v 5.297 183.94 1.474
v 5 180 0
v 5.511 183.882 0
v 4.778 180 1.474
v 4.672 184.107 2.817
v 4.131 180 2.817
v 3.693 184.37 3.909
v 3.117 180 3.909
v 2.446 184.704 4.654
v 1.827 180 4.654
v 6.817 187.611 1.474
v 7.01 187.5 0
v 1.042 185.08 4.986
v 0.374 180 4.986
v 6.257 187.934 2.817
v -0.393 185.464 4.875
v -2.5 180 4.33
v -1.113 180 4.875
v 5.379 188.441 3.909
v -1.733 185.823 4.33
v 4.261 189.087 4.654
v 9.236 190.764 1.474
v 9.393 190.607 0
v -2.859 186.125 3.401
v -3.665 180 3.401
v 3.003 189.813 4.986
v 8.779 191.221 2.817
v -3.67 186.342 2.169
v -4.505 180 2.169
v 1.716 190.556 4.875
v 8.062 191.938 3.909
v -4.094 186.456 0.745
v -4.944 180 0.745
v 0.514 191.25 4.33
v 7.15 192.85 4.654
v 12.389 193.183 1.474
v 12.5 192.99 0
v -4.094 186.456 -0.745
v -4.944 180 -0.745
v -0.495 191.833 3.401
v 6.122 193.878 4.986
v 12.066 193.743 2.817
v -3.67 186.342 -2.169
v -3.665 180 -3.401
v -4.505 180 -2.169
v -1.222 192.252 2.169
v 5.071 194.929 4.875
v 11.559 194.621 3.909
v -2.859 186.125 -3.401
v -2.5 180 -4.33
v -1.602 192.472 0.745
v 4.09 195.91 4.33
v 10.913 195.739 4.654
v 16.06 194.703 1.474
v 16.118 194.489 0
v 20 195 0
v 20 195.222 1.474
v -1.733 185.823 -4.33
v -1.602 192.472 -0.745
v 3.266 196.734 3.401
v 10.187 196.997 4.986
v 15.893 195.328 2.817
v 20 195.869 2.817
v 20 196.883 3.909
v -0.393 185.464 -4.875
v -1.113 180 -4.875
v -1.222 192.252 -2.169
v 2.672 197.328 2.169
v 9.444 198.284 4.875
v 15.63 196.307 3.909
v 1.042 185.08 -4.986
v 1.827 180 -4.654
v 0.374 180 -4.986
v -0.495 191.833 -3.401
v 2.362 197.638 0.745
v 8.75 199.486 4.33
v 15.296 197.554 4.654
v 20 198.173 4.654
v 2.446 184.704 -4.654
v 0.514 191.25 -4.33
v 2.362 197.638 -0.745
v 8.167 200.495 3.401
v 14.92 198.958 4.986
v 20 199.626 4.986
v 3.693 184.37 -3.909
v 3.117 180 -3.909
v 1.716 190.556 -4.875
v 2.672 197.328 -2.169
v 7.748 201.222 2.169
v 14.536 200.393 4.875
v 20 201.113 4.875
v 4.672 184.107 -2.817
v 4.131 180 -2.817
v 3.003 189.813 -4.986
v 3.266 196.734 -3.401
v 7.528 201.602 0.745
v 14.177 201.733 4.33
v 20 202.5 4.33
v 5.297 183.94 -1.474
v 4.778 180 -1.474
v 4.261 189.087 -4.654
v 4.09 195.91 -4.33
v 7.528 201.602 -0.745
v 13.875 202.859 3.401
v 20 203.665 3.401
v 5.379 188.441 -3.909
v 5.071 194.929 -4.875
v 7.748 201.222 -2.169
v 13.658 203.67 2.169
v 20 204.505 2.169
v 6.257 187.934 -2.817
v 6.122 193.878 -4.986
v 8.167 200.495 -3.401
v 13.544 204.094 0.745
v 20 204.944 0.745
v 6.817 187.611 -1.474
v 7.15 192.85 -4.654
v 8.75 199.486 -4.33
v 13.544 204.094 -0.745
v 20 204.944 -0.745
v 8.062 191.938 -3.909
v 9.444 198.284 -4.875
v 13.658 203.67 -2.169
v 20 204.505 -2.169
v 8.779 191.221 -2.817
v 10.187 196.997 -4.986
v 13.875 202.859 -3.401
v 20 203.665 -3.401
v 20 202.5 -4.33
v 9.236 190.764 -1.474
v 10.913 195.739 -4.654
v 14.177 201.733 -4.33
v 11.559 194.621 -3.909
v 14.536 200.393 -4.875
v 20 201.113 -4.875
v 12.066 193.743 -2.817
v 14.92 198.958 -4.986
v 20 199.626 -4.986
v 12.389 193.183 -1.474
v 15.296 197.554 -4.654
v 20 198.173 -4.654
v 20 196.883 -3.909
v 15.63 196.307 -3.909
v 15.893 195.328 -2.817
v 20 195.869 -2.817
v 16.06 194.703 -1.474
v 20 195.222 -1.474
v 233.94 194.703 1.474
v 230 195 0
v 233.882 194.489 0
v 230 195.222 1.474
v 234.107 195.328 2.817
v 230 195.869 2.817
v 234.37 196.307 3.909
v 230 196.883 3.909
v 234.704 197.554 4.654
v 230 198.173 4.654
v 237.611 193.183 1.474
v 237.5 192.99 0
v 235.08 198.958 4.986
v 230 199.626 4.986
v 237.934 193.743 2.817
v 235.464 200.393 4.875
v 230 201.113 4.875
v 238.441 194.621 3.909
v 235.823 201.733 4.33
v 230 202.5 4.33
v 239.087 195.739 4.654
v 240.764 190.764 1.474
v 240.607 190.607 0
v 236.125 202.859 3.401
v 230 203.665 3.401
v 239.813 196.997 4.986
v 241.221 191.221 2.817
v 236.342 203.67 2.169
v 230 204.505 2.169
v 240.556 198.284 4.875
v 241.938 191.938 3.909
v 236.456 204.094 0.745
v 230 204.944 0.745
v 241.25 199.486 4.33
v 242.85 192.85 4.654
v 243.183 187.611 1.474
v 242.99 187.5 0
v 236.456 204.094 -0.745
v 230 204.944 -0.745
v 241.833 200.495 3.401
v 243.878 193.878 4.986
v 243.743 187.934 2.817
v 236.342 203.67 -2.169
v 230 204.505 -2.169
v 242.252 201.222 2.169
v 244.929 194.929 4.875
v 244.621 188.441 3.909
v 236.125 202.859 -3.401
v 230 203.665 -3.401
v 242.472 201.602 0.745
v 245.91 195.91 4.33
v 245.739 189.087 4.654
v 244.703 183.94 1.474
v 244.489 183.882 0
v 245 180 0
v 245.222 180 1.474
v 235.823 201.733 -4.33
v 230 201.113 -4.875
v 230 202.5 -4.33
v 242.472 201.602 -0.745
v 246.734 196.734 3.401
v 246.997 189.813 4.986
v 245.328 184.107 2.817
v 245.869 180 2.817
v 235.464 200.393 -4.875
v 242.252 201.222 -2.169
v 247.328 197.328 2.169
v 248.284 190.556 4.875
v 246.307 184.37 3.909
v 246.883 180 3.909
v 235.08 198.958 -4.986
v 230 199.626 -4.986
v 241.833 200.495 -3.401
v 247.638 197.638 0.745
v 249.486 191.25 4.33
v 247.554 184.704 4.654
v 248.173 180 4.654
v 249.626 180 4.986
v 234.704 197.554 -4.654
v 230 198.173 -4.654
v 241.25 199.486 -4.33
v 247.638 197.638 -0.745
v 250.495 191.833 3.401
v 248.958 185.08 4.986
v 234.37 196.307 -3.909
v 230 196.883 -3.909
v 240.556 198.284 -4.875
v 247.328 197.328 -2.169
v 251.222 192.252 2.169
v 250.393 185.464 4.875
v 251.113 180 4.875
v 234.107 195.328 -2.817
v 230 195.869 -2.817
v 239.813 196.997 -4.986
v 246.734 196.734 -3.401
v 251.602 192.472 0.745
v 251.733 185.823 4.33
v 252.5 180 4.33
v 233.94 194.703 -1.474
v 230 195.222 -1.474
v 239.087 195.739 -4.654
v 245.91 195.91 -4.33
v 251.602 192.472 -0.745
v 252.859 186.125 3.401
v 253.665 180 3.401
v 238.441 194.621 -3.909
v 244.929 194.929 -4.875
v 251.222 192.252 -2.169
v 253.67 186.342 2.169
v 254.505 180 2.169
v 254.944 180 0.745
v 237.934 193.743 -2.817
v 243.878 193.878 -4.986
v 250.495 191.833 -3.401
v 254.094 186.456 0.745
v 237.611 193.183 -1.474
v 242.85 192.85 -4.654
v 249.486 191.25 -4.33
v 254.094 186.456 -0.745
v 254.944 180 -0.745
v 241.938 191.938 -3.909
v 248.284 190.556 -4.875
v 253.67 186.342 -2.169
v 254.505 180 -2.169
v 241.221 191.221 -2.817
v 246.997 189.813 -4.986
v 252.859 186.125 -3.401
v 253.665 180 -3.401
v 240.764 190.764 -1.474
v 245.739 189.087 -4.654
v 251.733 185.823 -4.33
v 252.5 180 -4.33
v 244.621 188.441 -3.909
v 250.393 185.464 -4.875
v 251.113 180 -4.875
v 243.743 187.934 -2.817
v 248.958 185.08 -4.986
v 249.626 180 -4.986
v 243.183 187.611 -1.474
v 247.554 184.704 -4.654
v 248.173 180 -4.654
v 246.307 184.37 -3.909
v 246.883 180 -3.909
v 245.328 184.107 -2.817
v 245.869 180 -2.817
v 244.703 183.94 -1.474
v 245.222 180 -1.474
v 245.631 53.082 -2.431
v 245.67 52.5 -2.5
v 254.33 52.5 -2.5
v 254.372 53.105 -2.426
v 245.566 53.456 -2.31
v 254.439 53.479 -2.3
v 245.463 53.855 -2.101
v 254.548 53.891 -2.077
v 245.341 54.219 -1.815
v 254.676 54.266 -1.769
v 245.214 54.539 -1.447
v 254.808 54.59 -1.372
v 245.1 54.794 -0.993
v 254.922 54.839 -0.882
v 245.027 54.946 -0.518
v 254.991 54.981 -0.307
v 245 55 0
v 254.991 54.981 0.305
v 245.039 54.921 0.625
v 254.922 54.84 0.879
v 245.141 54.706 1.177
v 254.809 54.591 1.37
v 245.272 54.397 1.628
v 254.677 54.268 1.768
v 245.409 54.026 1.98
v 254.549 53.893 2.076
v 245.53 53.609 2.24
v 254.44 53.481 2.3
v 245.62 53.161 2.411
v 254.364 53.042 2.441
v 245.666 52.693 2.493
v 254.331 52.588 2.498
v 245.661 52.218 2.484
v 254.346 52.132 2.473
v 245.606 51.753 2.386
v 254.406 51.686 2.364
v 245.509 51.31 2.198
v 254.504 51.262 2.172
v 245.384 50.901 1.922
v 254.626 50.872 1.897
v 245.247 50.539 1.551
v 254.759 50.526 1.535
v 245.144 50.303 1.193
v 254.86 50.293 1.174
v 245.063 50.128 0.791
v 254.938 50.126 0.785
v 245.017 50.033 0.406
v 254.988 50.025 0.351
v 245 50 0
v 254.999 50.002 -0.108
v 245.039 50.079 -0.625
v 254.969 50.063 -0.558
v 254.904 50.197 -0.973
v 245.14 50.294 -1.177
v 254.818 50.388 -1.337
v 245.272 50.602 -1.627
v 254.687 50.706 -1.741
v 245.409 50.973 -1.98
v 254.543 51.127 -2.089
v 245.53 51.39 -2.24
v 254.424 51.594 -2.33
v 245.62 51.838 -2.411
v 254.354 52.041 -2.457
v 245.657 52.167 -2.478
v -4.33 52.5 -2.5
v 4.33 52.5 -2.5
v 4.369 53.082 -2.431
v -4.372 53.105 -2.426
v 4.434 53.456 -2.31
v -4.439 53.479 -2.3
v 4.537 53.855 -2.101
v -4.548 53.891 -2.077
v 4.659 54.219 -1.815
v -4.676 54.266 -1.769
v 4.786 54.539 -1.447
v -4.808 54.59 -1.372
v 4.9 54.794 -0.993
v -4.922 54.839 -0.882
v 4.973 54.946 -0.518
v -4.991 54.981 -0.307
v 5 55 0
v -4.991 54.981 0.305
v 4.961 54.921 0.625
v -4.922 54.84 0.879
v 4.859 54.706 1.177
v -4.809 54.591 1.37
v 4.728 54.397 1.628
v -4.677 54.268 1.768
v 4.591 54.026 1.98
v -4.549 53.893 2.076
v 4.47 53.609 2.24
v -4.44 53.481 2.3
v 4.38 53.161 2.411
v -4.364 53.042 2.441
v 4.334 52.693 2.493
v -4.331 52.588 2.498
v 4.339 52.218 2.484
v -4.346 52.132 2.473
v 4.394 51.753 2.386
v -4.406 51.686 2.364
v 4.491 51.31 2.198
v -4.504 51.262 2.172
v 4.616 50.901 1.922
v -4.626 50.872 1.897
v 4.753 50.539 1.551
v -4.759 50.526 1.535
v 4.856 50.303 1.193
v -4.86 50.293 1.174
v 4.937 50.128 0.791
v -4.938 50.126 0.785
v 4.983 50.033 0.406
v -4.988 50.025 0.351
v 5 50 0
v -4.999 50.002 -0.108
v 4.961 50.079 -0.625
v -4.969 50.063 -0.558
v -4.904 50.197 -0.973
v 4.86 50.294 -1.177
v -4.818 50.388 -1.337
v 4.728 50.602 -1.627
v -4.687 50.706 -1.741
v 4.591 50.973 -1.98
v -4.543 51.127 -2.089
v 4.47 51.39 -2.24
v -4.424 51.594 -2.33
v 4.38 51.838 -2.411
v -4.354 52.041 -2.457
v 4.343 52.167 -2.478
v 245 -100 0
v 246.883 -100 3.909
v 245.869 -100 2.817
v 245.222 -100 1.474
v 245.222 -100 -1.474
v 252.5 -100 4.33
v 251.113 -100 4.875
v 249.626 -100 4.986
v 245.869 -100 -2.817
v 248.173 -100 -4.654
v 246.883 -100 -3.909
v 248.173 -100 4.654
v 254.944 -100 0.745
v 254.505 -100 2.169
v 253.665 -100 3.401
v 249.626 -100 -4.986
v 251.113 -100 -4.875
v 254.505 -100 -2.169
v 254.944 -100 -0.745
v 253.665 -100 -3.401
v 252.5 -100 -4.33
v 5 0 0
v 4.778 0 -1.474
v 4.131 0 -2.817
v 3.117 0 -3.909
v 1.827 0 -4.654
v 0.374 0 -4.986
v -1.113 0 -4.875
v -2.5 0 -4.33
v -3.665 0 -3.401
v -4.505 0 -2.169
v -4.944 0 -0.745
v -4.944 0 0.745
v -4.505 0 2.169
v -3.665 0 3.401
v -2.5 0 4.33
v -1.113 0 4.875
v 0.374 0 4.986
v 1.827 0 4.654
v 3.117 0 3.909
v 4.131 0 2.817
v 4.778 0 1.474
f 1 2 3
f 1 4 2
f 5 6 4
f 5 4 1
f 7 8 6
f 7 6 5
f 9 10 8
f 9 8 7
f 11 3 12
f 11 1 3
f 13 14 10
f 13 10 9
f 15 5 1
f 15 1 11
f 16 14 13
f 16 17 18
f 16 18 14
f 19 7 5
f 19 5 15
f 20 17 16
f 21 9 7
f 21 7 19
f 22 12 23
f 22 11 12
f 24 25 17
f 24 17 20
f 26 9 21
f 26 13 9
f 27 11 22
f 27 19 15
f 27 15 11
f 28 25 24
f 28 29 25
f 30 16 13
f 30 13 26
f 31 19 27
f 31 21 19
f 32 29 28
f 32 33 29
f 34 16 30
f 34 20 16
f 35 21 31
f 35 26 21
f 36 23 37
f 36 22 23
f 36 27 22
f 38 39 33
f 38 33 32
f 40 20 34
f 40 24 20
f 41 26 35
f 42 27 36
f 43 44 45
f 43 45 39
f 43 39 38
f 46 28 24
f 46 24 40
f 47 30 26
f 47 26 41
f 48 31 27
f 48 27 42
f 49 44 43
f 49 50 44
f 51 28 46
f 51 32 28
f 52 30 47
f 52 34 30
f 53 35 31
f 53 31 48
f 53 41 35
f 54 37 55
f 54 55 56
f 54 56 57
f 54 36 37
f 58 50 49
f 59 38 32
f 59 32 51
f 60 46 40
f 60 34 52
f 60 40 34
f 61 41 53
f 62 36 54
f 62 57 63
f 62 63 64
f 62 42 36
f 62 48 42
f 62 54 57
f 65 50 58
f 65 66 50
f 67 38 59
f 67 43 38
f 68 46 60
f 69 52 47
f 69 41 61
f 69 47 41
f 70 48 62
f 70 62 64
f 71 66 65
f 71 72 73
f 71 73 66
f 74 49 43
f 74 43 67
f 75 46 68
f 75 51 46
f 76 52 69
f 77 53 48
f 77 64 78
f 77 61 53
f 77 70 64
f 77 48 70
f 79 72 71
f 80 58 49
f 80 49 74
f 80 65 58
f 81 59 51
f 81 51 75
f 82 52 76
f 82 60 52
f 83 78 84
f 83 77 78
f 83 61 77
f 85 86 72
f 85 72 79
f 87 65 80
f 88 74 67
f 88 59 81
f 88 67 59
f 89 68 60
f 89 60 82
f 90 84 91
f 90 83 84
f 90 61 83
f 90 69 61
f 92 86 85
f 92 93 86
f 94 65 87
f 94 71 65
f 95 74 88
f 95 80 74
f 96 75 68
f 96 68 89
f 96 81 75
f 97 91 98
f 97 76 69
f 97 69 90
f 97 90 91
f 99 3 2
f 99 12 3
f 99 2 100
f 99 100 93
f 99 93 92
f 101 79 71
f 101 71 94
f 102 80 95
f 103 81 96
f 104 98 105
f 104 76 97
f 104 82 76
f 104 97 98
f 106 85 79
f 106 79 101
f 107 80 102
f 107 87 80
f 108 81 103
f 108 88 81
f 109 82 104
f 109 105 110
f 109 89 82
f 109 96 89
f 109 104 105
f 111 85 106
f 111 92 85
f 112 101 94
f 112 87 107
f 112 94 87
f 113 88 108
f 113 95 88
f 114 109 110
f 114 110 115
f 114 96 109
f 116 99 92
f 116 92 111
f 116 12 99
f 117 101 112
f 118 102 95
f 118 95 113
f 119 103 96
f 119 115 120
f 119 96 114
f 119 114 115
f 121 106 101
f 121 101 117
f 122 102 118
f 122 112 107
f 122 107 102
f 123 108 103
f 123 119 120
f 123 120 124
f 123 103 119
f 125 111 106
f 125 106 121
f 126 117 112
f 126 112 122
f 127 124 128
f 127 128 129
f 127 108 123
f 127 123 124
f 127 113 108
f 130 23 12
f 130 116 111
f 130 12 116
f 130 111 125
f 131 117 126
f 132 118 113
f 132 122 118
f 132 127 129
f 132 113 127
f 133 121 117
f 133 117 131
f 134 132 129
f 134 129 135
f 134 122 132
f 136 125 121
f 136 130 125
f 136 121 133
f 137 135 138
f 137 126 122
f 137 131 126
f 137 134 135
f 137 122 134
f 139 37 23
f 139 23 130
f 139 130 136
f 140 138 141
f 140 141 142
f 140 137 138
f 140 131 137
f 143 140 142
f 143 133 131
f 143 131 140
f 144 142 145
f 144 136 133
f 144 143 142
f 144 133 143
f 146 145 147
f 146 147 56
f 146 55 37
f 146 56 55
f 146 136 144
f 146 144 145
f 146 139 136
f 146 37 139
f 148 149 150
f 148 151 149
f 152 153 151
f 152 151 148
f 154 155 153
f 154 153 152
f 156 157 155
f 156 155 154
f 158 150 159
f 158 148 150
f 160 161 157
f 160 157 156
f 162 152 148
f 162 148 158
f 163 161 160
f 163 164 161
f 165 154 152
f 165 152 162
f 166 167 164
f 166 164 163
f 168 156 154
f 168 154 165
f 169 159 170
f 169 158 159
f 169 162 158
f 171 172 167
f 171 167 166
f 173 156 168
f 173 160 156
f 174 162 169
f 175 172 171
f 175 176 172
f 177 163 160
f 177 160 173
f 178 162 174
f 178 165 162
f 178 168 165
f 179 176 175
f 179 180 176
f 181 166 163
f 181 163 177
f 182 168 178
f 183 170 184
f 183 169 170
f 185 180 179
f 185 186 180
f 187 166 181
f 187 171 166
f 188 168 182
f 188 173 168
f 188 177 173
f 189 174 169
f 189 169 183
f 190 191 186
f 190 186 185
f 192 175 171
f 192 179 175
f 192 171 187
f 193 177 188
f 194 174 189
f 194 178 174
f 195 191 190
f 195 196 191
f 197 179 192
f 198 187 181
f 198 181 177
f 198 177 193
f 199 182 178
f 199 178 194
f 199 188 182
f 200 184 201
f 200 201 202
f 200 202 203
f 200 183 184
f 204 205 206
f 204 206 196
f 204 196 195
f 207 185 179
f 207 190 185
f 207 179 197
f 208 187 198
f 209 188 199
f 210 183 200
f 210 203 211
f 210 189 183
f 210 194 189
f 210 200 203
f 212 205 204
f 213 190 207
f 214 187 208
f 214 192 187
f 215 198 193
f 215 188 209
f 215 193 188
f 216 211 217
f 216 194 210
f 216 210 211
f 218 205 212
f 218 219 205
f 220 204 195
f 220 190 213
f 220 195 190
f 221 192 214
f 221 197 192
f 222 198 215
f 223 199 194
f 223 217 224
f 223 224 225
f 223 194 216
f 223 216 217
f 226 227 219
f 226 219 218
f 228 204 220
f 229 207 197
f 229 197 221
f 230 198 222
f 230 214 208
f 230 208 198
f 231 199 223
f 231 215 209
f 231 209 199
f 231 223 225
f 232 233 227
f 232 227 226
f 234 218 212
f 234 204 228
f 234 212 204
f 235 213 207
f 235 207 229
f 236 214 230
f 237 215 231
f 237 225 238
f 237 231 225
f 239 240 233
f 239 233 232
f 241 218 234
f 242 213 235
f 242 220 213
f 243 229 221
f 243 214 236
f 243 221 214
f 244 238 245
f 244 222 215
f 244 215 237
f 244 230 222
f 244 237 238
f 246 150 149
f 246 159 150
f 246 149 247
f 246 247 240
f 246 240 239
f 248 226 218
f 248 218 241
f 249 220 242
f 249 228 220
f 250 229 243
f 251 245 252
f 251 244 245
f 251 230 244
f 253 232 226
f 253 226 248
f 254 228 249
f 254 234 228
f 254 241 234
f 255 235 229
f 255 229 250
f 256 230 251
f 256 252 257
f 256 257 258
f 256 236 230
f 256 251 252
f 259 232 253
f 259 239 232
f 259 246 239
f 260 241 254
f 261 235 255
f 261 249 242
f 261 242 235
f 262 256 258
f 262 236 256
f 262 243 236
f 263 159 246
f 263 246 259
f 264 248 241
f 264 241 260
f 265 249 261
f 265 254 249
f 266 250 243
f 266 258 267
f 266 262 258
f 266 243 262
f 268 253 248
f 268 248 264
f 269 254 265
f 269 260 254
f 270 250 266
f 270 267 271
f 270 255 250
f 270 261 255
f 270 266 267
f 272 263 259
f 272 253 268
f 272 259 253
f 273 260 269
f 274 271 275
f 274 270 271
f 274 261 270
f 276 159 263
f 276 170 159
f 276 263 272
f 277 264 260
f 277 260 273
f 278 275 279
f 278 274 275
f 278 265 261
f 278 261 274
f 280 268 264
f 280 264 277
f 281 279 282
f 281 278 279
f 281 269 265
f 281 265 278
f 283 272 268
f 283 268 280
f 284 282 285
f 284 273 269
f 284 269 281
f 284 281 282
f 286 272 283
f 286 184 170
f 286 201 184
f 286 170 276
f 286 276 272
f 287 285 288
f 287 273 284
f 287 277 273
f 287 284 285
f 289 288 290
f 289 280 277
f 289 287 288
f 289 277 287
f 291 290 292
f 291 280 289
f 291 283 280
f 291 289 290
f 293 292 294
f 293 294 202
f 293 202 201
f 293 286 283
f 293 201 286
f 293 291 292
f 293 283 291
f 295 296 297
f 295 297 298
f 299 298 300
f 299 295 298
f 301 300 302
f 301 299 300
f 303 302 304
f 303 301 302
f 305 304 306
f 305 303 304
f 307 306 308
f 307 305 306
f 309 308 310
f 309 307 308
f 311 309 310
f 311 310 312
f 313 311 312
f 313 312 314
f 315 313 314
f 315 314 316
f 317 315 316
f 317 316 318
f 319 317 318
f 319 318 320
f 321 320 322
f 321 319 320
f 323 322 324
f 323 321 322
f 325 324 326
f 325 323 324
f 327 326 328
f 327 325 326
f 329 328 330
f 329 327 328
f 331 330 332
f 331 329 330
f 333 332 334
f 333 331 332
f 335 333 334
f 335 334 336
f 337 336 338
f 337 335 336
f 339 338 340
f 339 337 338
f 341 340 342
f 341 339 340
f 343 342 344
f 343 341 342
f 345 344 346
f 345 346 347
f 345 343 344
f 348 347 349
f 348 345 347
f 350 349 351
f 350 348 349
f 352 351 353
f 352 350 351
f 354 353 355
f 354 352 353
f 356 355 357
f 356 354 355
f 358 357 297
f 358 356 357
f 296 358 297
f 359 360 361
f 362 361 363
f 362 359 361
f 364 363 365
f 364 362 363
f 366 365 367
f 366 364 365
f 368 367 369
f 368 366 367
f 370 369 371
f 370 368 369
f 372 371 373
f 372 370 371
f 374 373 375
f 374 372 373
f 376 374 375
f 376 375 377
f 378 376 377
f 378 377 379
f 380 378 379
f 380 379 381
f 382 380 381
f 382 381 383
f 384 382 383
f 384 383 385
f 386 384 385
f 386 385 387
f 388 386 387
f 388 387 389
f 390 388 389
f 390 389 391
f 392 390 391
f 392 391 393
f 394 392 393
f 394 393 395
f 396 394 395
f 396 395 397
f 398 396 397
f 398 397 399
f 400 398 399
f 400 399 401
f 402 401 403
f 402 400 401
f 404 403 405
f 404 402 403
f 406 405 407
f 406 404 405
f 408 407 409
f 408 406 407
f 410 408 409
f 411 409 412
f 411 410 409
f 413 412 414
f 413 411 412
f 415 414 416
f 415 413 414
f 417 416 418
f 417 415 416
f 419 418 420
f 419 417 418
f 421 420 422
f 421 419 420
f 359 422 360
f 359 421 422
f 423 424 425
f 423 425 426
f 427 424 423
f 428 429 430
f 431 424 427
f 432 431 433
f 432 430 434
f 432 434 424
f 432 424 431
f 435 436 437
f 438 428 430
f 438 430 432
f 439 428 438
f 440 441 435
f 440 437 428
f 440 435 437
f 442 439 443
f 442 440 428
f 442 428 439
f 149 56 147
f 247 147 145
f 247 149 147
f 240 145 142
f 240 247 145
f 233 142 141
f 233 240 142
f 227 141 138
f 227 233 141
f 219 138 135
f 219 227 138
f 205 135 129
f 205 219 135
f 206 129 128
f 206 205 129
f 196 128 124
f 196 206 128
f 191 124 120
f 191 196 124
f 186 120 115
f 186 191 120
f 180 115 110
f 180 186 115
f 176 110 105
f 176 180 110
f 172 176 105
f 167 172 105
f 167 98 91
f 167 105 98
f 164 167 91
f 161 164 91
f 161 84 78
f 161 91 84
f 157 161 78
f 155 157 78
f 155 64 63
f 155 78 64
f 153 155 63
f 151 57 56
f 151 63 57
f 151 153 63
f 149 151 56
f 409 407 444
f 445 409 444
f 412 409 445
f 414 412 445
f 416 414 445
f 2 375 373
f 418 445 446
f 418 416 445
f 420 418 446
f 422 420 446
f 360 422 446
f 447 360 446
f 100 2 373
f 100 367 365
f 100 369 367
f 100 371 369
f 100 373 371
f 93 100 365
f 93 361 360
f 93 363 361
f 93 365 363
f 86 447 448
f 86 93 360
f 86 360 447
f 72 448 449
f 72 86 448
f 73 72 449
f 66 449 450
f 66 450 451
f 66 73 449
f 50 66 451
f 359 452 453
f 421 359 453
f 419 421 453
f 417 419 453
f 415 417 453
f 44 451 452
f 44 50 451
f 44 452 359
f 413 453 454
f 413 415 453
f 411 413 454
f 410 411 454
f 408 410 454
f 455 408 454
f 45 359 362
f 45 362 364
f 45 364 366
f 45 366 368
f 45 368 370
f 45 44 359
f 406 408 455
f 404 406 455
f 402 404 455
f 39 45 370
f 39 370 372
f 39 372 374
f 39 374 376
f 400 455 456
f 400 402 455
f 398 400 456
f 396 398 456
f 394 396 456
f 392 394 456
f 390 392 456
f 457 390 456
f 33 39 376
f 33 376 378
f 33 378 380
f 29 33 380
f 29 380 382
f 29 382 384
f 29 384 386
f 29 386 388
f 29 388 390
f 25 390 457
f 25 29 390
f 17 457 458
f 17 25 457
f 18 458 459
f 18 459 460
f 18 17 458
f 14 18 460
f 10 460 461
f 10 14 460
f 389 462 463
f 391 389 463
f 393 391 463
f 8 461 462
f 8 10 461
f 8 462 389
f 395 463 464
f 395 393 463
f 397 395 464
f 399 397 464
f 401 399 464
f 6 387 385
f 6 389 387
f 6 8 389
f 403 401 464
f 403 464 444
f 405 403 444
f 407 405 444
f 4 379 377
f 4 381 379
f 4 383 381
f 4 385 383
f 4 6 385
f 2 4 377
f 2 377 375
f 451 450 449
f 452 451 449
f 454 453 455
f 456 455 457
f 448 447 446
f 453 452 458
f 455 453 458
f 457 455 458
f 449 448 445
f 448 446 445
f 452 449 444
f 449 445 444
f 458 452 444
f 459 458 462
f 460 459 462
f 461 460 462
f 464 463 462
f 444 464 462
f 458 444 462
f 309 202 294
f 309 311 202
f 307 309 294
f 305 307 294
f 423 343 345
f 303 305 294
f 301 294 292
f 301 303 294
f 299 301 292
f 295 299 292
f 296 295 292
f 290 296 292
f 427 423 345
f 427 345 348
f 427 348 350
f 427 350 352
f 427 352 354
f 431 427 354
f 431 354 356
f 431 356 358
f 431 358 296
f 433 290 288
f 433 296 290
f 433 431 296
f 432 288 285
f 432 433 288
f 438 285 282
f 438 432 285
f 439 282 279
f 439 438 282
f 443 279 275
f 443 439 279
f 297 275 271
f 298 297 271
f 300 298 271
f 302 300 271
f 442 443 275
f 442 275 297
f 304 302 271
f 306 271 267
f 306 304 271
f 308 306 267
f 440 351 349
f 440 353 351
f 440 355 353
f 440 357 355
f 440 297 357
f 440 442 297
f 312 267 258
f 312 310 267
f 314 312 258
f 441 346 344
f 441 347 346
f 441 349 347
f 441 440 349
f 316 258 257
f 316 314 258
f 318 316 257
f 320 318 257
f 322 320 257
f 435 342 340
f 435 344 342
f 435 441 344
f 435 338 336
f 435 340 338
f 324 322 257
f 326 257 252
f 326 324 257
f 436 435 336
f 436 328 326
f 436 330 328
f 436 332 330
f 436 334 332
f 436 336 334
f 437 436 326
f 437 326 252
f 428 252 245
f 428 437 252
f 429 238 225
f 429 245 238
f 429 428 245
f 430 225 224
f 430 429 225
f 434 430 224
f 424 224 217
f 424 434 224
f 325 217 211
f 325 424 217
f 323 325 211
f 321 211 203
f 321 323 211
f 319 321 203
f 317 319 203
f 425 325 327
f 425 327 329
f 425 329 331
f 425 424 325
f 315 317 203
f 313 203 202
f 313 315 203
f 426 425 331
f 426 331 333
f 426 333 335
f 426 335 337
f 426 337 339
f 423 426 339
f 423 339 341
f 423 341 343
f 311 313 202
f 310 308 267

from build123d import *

# Parameters (mm, degrees)
CROQUIS2_R                 = 5
CORTAR_EXTRUIR2_DEPTH      = 328.223165581
CORTAR_EXTRUIR2_DEPTH_BACK = 328.223165581
CROQUIS4_R                 = 2.5


with BuildPart() as part:
    # Barrer1: sweep along a path in Croquis1
    with BuildLine(Plane.XY) as barrer1_path:
        Line((0, 0), (0, 180))
        ThreePointArc((0, 180), (5.857864376, 194.142135624), (20, 200))
        Line((20, 200), (230, 200))
        ThreePointArc((230, 200), (244.142135624, 194.142135624), (250, 180))
        Line((250, 180), (250, -100))
    # Croquis2 → Barrer1 (sweep)
    with BuildSketch(Plane(origin=(0, 0, 0), x_dir=(1, 0, 0), z_dir=(0, 1, 0))):
        Circle(CROQUIS2_R)
    sweep(path=barrer1_path.line)

    # Croquis4 → Cortar-Extruir2 (cut, two sides: drawn at the far end of the back side and taken through both)
    with BuildSketch(Plane(origin=(0, 0, 0), x_dir=(0, 0, -1), z_dir=(1, 0, 0)).offset(-CORTAR_EXTRUIR2_DEPTH_BACK)):
        with Locations((0, 52.5)):
            Circle(CROQUIS4_R)
    extrude(amount=CORTAR_EXTRUIR2_DEPTH + CORTAR_EXTRUIR2_DEPTH_BACK, mode=Mode.SUBTRACT)


solid = part.part
